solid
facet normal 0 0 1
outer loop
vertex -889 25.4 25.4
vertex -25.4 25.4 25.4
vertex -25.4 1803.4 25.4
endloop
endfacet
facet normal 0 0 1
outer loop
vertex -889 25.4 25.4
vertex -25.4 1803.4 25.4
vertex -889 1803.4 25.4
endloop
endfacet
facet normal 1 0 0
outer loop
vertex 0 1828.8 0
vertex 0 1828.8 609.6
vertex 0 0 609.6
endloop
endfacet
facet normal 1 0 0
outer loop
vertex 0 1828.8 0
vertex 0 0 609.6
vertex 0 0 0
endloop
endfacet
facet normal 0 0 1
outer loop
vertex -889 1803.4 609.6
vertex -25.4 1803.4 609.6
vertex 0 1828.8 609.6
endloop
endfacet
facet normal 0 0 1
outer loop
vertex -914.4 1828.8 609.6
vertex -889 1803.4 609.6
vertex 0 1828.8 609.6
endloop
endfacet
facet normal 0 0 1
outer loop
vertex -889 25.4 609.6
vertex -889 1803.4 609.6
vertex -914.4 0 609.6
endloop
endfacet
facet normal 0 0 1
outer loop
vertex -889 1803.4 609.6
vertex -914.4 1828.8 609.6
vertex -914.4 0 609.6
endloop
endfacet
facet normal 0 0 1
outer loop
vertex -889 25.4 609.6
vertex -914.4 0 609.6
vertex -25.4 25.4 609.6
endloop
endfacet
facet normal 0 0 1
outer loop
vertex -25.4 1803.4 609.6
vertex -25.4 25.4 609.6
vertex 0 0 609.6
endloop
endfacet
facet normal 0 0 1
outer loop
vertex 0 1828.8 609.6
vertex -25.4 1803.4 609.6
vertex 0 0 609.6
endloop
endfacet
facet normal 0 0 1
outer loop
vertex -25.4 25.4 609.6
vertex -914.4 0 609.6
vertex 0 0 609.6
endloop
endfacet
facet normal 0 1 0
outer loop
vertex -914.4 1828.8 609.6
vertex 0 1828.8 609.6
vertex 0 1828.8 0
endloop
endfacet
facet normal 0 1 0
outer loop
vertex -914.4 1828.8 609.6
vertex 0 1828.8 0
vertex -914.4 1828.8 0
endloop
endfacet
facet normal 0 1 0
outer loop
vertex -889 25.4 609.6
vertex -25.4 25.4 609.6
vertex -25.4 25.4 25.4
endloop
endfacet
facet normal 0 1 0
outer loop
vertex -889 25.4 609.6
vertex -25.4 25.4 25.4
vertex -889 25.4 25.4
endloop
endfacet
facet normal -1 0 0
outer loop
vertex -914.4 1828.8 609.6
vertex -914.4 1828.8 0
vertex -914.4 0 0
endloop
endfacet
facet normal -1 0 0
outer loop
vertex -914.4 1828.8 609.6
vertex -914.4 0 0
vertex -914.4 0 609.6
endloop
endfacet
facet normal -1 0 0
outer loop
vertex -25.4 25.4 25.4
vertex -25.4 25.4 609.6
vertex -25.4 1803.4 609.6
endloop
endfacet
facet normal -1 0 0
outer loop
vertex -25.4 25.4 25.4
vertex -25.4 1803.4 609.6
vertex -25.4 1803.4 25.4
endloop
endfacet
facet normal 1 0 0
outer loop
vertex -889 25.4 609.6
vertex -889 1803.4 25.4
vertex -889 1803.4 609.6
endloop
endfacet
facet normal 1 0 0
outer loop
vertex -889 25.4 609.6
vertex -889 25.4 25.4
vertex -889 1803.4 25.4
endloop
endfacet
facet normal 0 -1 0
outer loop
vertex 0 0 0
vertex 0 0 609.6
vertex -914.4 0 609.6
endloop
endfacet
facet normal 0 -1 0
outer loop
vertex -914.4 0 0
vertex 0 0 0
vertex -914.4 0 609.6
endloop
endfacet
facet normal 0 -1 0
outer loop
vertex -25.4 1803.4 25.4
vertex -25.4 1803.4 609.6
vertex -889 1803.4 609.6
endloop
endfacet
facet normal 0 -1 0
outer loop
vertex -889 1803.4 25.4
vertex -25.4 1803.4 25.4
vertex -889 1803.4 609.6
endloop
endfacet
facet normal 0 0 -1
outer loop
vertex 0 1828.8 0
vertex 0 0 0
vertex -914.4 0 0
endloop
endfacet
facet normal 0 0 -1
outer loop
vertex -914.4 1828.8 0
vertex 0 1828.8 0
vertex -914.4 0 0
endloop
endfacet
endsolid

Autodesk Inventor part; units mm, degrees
ref_plane "YZ Plane" through (0, 0, 0) normal (1, 0, 0) x (0, 1, 0)
ref_plane "XZ Plane" through (0, 0, 0) normal (0, 1, 0) x (-1, 0, 0)
ref_plane "XY Plane" through (0, 0, 0) normal (0, 0, 1) x (1, 0, 0)
sketch "grey cabinet" plane through (0, 0, 0) normal (0, 1, 0) x (-1, 0, 0)
  line L0 (914.4, 609.6) -> (0, 609.6)
  line L1 (0, 609.6) -> (0, 0)
  line L2 (0, 0) -> (914.4, 0)
  line L3 (914.4, 0) -> (914.4, 609.6)
  dimension "d0" = 914.4
  dimension "d1" = 609.6
extrude "grey cabinet2" add sketch "grey cabinet" along normal blind 1828.8
shell "Shell1" thickness 25.4 removed faces 1 at (-609.6, 609.6, 609.6)
properties part number "grey cabinet"
